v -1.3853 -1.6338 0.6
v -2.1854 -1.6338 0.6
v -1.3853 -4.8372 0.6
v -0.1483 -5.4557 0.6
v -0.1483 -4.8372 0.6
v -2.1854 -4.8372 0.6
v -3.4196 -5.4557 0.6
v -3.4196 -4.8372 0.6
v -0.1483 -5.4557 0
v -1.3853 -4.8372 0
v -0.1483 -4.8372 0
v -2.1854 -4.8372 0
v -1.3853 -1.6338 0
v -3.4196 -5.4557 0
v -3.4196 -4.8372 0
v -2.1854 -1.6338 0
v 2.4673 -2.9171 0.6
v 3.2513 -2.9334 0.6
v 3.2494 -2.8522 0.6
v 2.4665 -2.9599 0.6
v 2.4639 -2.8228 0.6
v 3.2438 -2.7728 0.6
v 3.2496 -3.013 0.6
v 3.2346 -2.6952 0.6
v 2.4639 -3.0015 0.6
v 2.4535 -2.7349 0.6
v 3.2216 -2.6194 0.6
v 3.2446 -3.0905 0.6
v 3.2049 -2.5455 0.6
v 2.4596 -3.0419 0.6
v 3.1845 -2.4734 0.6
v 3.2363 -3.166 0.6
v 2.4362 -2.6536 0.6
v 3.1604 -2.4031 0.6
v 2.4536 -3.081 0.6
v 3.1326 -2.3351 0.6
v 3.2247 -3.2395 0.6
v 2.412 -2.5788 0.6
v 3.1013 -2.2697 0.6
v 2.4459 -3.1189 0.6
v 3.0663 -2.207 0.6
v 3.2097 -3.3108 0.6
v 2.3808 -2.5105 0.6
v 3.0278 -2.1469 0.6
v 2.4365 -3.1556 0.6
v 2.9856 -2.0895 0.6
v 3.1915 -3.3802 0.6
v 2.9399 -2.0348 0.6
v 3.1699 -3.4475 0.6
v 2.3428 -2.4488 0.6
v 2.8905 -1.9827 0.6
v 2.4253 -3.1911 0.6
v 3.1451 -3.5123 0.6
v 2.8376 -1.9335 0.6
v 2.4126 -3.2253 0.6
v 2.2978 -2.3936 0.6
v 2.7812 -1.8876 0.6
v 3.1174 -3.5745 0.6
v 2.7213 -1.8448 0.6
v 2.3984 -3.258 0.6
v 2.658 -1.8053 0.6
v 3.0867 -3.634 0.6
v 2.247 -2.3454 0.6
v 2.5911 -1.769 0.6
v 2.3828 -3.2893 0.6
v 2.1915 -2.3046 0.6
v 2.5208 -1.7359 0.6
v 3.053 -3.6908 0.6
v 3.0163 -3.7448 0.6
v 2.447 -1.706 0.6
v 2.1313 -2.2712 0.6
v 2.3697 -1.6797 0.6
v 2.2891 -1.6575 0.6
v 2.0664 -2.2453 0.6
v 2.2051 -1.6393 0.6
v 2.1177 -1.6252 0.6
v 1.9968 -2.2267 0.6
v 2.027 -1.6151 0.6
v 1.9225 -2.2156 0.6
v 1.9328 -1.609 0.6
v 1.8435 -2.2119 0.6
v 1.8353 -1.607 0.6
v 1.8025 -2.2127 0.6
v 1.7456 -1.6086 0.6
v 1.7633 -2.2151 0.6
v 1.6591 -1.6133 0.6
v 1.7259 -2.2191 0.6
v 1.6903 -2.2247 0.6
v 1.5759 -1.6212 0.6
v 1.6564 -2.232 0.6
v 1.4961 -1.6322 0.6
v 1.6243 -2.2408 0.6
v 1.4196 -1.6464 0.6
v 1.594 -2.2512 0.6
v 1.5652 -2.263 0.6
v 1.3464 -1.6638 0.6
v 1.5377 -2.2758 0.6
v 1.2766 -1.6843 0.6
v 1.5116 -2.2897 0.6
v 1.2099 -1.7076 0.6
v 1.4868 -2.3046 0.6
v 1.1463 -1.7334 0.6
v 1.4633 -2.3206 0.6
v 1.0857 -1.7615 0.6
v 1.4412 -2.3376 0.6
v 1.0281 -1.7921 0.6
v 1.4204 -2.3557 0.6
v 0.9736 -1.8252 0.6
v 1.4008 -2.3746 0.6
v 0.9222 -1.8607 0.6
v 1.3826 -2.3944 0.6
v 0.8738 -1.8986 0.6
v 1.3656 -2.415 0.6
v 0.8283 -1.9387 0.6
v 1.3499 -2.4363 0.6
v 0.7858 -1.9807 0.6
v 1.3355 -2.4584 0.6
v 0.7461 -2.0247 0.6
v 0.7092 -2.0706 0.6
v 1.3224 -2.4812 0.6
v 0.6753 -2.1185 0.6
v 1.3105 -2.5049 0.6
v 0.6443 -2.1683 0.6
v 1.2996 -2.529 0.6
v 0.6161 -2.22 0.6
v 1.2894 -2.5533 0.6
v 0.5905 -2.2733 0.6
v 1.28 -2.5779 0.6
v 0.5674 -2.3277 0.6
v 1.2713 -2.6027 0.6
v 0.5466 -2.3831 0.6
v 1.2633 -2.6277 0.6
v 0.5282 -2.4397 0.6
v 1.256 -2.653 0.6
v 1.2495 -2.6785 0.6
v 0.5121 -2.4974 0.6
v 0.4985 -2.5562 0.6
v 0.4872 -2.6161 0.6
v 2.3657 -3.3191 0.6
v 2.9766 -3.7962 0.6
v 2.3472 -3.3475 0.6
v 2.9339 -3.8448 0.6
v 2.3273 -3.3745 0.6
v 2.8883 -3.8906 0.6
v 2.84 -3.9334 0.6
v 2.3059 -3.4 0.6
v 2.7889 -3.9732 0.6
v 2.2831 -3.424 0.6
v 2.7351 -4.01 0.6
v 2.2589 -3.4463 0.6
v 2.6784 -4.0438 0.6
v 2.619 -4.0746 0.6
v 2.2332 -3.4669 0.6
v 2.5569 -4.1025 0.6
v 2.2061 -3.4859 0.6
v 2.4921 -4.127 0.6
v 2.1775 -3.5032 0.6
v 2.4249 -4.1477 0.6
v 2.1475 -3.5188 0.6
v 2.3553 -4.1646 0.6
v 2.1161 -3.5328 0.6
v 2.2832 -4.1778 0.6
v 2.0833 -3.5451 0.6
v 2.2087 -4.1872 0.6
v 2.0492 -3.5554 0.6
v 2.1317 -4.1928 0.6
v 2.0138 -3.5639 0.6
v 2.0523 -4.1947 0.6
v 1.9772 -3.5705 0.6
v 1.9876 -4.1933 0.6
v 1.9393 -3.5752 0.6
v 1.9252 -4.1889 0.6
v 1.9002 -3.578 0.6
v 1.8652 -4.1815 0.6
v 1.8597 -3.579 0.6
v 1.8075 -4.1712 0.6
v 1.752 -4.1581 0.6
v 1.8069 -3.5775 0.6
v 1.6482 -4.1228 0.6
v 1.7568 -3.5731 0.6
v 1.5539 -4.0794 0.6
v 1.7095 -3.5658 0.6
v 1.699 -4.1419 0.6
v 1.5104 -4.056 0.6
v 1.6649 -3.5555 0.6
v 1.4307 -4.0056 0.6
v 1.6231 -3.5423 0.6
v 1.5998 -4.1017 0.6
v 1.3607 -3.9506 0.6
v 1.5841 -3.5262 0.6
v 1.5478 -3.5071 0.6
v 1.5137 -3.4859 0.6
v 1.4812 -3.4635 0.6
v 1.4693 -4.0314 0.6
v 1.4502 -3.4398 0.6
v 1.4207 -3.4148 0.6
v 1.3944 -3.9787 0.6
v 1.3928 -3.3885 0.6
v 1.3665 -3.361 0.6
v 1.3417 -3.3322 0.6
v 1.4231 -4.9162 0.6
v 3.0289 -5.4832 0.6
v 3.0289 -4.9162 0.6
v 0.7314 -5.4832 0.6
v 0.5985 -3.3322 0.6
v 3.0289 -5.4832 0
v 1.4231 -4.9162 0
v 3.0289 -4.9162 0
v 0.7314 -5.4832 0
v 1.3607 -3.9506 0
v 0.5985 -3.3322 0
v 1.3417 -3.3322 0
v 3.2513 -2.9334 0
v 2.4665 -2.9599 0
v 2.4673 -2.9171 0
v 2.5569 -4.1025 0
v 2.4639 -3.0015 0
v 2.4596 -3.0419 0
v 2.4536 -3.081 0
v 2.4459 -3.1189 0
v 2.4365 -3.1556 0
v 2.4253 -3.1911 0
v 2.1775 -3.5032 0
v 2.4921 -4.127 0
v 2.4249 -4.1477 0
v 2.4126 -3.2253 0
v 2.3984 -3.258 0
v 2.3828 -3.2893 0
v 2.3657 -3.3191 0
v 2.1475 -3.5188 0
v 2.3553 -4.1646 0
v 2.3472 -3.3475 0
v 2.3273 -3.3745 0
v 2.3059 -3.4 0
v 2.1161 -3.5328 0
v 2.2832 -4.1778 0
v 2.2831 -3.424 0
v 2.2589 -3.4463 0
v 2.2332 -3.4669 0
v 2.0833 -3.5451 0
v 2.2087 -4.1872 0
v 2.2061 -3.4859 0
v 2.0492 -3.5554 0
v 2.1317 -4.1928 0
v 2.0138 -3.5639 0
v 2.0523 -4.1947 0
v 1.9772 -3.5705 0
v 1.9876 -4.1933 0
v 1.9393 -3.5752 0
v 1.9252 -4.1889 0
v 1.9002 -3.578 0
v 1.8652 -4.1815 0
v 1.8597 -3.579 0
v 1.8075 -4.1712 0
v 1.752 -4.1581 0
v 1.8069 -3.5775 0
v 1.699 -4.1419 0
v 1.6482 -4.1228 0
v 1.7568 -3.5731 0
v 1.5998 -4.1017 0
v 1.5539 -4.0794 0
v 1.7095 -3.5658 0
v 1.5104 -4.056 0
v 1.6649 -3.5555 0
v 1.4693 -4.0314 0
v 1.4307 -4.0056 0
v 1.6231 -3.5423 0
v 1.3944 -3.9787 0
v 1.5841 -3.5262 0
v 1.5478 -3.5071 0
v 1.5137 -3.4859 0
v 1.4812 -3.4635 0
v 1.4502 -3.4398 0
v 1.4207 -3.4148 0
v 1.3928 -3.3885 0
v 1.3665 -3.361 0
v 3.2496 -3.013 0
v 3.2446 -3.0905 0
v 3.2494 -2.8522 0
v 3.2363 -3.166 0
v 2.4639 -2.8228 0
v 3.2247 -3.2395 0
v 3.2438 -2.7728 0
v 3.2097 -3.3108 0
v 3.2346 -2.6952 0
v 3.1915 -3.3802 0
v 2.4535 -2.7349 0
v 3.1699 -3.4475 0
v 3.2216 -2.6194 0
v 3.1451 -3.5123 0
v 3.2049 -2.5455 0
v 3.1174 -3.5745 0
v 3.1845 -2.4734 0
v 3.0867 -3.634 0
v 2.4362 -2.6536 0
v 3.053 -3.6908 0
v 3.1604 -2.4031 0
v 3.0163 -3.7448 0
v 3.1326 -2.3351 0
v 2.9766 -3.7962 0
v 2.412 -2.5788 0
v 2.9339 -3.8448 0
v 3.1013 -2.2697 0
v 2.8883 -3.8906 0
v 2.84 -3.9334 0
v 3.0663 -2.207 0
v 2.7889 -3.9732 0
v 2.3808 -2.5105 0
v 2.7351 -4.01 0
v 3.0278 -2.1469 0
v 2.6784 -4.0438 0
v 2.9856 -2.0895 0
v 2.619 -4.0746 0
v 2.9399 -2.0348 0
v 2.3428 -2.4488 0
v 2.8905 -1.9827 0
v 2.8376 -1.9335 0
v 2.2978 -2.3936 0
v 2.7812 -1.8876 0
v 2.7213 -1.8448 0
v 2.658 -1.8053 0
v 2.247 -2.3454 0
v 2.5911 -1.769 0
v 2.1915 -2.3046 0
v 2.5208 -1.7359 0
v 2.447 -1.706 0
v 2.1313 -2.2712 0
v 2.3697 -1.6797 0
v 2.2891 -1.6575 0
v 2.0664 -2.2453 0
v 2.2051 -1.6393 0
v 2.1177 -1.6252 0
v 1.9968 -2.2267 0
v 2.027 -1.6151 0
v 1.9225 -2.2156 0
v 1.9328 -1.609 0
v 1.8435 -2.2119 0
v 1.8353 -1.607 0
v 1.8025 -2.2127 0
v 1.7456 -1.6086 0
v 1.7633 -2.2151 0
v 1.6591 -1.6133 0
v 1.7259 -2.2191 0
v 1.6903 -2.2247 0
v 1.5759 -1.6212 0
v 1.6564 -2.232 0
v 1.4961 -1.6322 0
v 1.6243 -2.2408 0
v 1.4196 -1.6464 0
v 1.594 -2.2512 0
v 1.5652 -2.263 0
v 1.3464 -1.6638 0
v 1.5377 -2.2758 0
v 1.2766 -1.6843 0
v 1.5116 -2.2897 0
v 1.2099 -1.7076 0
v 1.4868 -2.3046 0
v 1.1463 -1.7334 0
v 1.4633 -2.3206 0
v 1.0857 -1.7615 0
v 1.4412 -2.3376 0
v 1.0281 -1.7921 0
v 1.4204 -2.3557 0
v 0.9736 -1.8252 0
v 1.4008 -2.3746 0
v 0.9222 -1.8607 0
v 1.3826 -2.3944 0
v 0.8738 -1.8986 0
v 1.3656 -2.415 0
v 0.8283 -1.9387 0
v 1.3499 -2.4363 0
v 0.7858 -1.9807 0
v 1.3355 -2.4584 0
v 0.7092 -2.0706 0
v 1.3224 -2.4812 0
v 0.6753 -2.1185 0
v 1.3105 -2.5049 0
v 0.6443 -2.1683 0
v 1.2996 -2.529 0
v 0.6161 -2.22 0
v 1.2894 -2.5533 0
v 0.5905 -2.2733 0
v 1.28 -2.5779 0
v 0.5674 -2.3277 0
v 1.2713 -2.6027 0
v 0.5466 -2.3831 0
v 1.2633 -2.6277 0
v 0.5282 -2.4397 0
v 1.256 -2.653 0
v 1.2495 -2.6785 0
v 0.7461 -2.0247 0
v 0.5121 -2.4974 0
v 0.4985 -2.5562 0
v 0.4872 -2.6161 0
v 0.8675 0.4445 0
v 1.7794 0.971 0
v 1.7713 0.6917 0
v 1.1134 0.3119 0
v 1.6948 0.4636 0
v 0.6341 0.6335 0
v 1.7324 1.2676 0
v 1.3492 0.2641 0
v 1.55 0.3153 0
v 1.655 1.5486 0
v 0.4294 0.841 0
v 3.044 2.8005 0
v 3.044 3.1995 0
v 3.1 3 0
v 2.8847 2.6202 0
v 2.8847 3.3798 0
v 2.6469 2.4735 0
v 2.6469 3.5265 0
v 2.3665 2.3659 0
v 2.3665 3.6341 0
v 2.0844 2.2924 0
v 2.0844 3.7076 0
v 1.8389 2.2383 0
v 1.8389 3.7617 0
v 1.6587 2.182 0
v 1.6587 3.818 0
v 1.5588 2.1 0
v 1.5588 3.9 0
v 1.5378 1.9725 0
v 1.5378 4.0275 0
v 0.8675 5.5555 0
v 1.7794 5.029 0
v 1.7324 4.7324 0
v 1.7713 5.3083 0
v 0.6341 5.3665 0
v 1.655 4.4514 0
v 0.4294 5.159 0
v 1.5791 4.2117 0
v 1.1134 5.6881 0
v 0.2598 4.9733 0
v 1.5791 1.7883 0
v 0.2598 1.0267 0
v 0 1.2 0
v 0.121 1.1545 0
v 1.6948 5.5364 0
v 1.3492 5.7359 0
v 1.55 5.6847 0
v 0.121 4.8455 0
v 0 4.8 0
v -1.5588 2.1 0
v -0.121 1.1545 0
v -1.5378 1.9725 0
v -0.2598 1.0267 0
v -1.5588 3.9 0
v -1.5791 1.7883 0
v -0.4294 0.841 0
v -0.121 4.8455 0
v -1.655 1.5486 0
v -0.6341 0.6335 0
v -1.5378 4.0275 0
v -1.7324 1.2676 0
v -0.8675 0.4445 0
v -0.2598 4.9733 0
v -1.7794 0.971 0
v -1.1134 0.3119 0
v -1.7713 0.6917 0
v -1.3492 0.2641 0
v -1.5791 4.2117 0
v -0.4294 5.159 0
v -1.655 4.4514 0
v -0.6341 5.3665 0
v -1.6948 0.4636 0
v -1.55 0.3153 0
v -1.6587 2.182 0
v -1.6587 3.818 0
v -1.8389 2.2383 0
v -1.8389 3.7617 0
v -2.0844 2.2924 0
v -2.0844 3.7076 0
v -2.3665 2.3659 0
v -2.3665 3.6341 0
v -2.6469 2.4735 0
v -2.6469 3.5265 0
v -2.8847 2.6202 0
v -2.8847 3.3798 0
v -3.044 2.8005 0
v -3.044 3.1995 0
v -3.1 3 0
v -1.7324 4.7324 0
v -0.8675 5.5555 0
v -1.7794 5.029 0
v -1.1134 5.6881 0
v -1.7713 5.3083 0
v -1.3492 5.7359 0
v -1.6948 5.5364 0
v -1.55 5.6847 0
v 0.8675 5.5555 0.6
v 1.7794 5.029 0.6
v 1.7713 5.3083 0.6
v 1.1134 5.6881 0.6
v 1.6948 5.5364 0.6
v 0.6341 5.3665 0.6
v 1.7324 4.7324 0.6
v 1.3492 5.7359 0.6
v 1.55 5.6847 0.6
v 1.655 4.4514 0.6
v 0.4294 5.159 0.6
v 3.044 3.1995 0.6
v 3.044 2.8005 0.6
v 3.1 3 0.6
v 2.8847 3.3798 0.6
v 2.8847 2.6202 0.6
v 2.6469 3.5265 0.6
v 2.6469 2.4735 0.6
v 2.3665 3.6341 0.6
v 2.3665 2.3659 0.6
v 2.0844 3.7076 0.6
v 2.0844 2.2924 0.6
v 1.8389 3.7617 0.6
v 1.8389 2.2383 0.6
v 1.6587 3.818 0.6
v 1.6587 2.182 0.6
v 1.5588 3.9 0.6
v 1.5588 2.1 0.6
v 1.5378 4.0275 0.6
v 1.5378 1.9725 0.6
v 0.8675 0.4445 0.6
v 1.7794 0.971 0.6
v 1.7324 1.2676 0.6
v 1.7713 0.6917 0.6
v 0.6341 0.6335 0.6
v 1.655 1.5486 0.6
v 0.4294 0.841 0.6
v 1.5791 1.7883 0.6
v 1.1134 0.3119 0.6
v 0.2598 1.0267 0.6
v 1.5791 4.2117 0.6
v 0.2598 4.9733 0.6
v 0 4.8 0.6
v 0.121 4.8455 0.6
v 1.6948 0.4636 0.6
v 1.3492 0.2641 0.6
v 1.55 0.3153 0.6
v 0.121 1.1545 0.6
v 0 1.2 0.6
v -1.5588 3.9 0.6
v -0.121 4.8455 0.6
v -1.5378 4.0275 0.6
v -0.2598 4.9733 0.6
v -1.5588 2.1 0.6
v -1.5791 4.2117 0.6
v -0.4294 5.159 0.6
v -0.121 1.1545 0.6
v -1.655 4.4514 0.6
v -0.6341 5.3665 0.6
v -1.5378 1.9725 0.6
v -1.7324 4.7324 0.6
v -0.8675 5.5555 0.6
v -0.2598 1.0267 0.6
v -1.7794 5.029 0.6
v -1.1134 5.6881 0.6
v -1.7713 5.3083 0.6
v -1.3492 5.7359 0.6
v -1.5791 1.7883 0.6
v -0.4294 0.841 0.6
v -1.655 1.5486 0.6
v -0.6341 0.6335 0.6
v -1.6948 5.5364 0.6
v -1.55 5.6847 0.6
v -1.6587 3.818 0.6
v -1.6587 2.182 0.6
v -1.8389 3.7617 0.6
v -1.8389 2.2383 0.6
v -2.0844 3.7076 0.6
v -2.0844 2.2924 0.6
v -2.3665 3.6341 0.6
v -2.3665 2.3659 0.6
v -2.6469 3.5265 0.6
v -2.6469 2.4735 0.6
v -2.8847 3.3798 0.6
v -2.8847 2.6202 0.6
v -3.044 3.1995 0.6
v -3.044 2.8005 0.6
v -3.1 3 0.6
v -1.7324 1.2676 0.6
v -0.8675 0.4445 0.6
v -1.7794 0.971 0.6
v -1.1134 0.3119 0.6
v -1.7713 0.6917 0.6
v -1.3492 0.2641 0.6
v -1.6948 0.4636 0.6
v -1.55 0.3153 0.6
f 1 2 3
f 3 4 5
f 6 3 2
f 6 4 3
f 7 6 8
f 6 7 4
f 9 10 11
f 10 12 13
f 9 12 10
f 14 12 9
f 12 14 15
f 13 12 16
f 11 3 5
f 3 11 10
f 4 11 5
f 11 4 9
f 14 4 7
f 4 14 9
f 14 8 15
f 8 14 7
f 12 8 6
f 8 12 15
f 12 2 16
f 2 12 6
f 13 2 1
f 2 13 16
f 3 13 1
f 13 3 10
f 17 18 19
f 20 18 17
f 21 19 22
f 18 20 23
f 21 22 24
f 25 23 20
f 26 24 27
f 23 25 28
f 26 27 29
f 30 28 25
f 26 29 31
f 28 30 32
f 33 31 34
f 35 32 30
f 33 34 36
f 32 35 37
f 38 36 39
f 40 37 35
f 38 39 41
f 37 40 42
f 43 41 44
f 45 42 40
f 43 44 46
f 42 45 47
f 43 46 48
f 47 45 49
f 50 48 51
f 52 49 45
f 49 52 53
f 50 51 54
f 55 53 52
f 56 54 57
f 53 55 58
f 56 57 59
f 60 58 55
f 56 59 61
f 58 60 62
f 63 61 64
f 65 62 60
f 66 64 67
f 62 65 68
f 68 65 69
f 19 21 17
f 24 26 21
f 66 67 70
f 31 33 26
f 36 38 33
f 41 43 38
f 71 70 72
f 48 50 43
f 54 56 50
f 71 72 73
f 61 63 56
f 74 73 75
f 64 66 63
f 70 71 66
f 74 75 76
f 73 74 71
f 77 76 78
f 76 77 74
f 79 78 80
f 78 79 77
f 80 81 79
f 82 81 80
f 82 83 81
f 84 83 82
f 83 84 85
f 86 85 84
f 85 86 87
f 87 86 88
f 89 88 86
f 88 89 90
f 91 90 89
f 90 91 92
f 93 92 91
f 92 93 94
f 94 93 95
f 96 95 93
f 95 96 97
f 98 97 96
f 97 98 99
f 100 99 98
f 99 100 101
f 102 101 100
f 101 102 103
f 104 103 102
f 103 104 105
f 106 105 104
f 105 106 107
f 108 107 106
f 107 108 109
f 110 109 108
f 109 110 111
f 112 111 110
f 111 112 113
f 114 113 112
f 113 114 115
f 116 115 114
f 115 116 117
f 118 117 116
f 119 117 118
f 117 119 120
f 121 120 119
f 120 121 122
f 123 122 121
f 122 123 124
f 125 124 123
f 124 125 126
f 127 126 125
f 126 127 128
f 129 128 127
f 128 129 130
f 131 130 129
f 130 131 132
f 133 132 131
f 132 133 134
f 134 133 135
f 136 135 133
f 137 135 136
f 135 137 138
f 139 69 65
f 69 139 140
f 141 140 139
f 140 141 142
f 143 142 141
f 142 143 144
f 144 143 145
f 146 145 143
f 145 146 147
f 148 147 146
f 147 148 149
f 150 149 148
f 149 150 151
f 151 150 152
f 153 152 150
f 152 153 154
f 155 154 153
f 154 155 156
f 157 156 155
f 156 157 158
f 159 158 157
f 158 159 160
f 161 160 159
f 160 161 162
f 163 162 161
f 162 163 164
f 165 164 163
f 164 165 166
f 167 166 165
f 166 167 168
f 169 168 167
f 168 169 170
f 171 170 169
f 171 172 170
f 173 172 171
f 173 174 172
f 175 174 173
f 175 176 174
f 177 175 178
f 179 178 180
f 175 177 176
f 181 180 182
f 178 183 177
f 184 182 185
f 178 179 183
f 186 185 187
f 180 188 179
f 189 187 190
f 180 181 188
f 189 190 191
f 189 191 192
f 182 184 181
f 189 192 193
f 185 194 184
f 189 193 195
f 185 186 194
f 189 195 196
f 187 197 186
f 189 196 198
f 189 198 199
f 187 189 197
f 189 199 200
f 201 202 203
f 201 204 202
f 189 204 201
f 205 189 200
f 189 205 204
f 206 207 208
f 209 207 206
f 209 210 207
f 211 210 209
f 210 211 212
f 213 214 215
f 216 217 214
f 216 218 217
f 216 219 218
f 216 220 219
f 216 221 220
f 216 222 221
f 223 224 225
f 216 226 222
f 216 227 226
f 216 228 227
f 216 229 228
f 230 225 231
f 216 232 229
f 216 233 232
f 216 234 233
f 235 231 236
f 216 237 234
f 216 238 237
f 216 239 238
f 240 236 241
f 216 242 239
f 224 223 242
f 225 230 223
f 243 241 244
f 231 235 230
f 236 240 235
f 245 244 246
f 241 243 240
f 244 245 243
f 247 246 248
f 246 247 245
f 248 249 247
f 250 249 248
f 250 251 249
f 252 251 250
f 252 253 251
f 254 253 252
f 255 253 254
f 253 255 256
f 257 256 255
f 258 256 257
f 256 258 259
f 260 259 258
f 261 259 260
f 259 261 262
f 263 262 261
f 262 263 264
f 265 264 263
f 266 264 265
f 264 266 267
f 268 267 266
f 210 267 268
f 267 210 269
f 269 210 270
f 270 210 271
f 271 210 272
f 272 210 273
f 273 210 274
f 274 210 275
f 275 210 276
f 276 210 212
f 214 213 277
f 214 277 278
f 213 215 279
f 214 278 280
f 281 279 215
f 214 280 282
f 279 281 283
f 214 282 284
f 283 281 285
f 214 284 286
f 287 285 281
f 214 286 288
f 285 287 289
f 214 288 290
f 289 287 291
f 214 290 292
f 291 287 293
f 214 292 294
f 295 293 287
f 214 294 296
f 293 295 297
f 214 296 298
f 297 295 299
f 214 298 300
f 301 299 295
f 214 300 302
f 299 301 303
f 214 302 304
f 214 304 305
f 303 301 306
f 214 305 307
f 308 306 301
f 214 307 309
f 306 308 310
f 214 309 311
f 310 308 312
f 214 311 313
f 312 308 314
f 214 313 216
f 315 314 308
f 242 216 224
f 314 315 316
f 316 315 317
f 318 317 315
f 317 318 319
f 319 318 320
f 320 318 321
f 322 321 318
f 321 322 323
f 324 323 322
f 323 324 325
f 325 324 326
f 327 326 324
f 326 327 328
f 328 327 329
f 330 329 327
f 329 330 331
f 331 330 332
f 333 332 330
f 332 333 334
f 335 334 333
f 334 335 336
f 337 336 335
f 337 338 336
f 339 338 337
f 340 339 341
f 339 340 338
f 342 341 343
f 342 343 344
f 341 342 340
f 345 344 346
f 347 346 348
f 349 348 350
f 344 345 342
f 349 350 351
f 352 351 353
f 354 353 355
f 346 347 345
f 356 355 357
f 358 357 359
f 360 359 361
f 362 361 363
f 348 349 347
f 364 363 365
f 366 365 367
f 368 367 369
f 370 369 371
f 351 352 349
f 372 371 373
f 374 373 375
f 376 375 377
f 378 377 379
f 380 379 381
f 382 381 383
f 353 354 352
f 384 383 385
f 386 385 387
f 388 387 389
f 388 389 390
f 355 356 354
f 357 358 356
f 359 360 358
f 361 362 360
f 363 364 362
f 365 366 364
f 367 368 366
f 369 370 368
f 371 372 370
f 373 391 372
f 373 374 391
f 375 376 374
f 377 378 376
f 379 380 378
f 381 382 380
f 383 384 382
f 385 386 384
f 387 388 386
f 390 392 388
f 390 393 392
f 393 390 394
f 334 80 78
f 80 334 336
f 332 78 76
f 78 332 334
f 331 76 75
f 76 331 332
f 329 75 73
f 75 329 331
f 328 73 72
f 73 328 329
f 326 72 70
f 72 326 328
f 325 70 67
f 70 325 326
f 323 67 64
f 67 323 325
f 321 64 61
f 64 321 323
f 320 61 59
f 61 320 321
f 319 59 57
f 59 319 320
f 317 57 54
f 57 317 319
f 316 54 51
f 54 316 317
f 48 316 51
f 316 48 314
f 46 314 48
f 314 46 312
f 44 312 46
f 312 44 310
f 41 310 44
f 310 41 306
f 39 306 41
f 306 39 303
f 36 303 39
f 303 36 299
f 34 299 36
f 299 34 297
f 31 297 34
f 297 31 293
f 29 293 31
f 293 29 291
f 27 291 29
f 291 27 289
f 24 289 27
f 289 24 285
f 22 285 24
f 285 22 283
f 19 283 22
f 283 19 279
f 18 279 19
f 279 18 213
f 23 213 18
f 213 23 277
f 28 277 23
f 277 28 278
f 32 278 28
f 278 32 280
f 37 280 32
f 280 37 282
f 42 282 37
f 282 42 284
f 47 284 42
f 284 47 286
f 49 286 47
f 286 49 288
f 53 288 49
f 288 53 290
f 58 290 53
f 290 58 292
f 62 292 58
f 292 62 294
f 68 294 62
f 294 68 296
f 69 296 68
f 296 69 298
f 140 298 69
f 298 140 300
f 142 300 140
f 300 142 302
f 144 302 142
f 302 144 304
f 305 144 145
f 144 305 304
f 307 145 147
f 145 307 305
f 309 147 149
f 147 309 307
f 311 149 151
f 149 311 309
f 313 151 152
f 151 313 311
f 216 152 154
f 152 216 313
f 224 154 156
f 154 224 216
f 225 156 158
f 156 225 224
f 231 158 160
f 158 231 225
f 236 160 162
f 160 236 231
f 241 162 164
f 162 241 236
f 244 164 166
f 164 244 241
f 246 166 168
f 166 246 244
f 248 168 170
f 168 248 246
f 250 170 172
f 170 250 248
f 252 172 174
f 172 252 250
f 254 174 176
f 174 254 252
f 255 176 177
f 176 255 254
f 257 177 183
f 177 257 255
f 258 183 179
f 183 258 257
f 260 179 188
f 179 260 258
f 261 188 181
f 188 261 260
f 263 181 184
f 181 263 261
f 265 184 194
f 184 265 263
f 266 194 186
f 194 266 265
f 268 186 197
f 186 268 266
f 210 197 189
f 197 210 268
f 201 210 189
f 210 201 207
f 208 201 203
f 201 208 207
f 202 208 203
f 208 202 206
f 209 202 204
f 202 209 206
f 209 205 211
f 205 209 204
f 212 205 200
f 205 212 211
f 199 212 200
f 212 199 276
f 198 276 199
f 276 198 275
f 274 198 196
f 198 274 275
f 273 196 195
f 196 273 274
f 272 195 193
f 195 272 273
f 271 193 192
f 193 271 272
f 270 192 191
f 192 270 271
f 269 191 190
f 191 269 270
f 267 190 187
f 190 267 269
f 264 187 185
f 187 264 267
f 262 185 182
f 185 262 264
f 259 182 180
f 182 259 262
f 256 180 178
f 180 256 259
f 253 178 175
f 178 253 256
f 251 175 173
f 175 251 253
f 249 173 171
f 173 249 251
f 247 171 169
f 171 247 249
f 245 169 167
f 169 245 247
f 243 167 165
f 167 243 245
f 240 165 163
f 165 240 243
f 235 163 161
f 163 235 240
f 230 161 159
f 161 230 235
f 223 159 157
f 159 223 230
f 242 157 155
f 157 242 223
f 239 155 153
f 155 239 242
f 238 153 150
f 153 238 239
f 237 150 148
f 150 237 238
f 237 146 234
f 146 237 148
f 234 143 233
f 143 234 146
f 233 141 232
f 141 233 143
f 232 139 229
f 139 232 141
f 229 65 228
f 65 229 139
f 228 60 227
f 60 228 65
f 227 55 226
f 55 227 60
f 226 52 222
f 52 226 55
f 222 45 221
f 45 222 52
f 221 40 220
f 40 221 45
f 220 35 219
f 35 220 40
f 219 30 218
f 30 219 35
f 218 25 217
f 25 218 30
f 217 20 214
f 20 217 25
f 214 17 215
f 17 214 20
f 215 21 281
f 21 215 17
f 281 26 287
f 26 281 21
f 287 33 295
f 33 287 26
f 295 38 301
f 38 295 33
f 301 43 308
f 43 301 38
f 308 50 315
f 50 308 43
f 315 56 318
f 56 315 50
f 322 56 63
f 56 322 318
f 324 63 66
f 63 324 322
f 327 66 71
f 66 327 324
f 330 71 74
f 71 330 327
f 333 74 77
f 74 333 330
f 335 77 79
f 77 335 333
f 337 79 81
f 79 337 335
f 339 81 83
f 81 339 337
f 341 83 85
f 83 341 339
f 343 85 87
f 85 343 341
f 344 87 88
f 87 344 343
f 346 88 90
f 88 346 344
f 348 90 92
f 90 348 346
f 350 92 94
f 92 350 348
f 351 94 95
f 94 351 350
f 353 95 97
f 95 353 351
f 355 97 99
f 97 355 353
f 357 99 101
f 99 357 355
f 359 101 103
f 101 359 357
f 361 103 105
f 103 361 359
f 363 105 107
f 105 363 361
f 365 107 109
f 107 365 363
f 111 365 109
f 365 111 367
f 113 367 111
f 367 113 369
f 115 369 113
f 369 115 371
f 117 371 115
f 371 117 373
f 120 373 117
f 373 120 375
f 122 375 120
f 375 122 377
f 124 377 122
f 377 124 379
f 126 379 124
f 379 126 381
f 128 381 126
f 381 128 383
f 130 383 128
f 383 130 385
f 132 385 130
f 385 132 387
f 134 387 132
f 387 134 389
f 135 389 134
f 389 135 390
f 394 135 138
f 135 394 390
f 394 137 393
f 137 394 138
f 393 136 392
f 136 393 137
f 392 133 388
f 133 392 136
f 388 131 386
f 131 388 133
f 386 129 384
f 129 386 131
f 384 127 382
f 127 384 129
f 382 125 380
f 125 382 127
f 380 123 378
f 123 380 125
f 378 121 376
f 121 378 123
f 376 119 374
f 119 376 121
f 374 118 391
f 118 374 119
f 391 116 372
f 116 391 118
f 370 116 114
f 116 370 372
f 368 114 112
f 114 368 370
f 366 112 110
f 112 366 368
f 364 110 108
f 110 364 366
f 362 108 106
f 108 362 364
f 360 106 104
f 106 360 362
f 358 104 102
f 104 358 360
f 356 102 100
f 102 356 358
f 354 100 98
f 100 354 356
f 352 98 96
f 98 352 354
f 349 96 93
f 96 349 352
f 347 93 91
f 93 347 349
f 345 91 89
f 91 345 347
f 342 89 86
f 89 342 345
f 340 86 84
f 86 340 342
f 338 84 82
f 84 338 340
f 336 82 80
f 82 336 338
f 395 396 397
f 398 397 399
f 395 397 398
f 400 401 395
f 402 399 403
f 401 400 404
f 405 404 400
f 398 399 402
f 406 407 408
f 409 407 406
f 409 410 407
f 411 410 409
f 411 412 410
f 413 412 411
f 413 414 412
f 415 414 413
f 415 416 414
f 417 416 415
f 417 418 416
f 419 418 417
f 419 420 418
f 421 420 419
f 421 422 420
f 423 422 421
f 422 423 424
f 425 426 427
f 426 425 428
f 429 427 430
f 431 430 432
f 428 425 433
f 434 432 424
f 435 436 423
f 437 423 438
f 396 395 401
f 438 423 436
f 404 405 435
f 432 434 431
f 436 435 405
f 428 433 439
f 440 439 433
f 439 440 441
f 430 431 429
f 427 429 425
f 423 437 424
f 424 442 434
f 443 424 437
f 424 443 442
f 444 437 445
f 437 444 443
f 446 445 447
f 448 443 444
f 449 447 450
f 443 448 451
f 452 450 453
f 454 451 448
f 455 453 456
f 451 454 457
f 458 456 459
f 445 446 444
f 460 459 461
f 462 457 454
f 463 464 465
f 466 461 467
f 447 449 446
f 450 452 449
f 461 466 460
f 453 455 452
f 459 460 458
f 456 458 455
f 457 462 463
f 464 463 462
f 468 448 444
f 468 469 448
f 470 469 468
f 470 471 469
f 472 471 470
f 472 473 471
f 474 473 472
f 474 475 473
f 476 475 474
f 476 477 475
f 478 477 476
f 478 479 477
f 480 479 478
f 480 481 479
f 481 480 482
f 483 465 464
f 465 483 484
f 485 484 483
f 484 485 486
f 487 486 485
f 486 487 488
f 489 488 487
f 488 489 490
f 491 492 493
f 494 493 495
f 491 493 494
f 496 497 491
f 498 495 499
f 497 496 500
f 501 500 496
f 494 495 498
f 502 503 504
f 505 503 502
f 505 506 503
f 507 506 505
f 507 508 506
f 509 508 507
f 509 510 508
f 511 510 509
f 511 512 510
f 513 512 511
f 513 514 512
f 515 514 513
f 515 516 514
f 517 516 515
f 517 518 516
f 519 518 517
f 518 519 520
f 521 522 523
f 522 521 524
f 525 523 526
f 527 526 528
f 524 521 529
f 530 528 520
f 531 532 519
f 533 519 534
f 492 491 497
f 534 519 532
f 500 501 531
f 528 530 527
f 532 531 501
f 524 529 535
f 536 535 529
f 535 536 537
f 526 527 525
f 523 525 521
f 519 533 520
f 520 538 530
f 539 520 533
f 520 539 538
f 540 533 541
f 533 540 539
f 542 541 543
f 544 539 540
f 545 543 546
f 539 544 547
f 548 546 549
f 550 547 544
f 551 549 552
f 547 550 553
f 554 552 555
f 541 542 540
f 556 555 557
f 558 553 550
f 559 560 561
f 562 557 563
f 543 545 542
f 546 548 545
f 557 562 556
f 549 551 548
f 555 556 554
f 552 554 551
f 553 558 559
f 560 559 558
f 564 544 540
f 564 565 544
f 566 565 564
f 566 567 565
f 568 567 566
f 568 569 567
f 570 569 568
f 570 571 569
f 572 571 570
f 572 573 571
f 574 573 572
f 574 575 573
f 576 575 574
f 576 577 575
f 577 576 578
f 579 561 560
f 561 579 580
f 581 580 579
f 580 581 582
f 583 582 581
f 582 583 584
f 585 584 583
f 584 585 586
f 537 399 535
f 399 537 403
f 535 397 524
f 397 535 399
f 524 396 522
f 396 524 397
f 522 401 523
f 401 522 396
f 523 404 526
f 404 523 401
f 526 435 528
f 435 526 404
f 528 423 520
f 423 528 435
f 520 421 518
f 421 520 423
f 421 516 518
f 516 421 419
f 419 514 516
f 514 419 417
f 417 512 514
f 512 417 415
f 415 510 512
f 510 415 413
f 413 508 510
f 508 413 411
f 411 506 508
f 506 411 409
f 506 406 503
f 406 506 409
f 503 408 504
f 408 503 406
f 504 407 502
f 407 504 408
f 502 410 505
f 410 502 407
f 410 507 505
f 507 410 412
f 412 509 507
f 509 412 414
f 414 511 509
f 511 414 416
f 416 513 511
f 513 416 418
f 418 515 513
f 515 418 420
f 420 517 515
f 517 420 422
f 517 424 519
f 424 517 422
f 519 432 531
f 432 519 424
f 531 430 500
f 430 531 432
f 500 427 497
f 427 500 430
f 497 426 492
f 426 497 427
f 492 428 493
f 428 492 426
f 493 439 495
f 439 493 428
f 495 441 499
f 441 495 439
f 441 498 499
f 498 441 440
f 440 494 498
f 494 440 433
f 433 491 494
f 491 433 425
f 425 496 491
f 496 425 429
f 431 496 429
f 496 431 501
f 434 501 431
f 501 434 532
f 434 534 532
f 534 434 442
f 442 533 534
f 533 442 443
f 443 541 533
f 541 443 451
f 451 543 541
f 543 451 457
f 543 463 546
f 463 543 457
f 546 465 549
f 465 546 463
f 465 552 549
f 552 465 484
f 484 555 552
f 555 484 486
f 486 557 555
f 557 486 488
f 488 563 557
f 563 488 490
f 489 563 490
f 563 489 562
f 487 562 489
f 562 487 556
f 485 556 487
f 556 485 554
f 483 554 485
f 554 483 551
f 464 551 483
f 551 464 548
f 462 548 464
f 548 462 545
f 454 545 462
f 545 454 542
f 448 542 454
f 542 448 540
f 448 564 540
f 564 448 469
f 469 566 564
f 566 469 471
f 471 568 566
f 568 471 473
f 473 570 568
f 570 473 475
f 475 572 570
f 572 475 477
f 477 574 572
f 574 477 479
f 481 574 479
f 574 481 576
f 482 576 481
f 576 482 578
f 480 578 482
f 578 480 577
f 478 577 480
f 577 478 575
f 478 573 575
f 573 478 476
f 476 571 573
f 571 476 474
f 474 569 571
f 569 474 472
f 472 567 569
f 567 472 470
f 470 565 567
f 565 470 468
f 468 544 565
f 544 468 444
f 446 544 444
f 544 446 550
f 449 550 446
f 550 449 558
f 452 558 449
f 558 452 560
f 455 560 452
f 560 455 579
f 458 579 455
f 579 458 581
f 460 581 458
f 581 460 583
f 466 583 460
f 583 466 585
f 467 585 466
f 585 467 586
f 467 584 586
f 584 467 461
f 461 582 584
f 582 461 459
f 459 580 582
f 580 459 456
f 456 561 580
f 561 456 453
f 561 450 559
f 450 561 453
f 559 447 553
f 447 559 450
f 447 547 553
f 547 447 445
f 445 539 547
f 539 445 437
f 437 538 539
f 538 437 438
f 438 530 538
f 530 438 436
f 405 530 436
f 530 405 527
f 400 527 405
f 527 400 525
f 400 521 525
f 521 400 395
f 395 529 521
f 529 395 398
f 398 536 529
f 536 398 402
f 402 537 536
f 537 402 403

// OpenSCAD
$fn = 50;

difference() {
	union() {
		translate(v = [-1.825, -3.5, 0.6]) {
			rotate(a = [180, 0, 0]) {
				linear_extrude(height = 0.6) {
					text(font = "Liberation Sans:style=Bold", halign = "center", size = 4.0, text = "T", valign = "center");
				}
			}
		}
		translate(v = [1.825, -3.5, 0.6]) {
			rotate(a = [180, 0, 0]) {
				linear_extrude(height = 0.6) {
					text(font = "Liberation Sans:style=Bold", halign = "center", size = 4.0, text = "5", valign = "center");
				}
			}
		}
		translate(v = [0, 3, 0]) {
			linear_extrude(height = 0.6) {
				polygon(points = [[3.1, 0.0], [3.0439902950186117, 0.1995136647114984], [2.8847272103883213, 0.3797815421059436], [2.646888617374527, 0.5264988810722369], [2.3665182744082176, 0.6341066605011758], [2.0844354103556904, 0.7075704773708675], [1.8388718910678303, 0.761685676746956], [1.658746676795018, 0.818003336606089], [1.55884572681199, 0.9], [1.5377850082788151, 1.0275150922444565], [1.5790750912955211, 1.211666933596394], [1.6549917135488983, 1.4513887792304347], [1.7324116139070416, 1.7324116139070416], [1.779405714759903, 2.0290233430980913], [1.7712640685463372, 2.3083562761315313], [1.6947790495515949, 2.5364160920036563], [1.5500000000000005, 2.68467875173176], [1.3492112454670173, 2.735929756715155], [1.1134631418419842, 2.688137818237475], [0.8674829026146248, 2.555522224170328], [0.6341066605011758, 2.3665182744082176], [0.42944369680679173, 2.1589592566013023], [0.2597967997723095, 1.9733526103433505], [0.120961668516203, 1.8455184288505457], [1.102182119232618e-16, 1.8000000000000003], [-0.12096166851620277, 1.8455184288505457], [-0.25979679977230924, 1.9733526103433503], [-0.42944369680679134, 2.158959256601302], [-0.6341066605011755, 2.366518274408217], [-0.8674829026146244, 2.555522224170328], [-1.1134631418419831, 2.688137818237475], [-1.3492112454670169, 2.735929756715155], [-1.5499999999999994, 2.68467875173176], [-1.6947790495515944, 2.536416092003656], [-1.7712640685463372, 2.3083562761315313], [-1.7794057147599032, 2.0290233430980913], [-1.7324116139070418, 1.732411613907042], [-1.6549917135488983, 1.4513887792304352], [-1.5790750912955214, 1.211666933596395], [-1.5377850082788156, 1.0275150922444576], [-1.55884572681199, 0.9], [-1.6587466767950174, 0.8180033366060897], [-1.8388718910678303, 0.7616856767469562], [-2.084435410355689, 0.7075704773708675], [-2.3665182744082154, 0.634106660501176], [-2.646888617374527, 0.5264988810722366], [-2.8847272103883204, 0.37978154210594467], [-3.0439902950186117, 0.1995136647114986], [-3.1, 3.796405077356795e-16], [-3.043990295018612, -0.19951366471149784], [-2.8847272103883213, -0.37978154210594417], [-2.646888617374528, -0.5264988810722362], [-2.366518274408217, -0.6341066605011759], [-2.0844354103556904, -0.7075704773708673], [-1.8388718910678312, -0.7616856767469561], [-1.6587466767950179, -0.8180033366060894], [-1.5588457268119902, -0.8999999999999996], [-1.5377850082788154, -1.0275150922444558], [-1.5790750912955211, -1.211666933596394], [-1.6549917135488978, -1.4513887792304343], [-1.7324116139070413, -1.7324116139070393], [-1.7794057147599032, -2.0290233430980904], [-1.7712640685463374, -2.30835627613153], [-1.6947790495515942, -2.5364160920036567], [-1.5500000000000014, -2.6846787517317594], [-1.349211245467018, -2.7359297567151555], [-1.1134631418419827, -2.688137818237474], [-0.8674829026146252, -2.5555222241703284], [-0.6341066605011755, -2.366518274408217], [-0.42944369680679256, -2.1589592566013027], [-0.2597967997723094, -1.973352610343351], [-0.12096166851620195, -1.8455184288505448], [-3.3065463576978537e-16, -1.8000000000000003], [0.12096166851620122, -1.8455184288505442], [0.2597967997723086, -1.9733526103433503], [0.4294436968067915, -2.1589592566013014], [0.6341066605011743, -2.3665182744082163], [0.8674829026146239, -2.5555222241703275], [1.1134631418419814, -2.688137818237473], [1.3492112454670167, -2.735929756715155], [1.5500000000000005, -2.68467875173176], [1.6947790495515938, -2.536416092003658], [1.7712640685463361, -2.3083562761315344], [1.7794057147599027, -2.0290233430980895], [1.732411613907041, -1.7324116139070416], [1.6549917135488992, -1.451388779230435], [1.5790750912955214, -1.2116669335963952], [1.5377850082788151, -1.0275150922444585], [1.5588457268119893, -0.9000000000000009], [1.658746676795018, -0.8180033366060894], [1.8388718910678303, -0.7616856767469555], [2.084435410355689, -0.7075704773708676], [2.366518274408215, -0.6341066605011774], [2.646888617374524, -0.5264988810722376], [2.8847272103883217, -0.37978154210594395], [3.0439902950186117, -0.1995136647114976]]);
			}
		}
	}
	union();
}
